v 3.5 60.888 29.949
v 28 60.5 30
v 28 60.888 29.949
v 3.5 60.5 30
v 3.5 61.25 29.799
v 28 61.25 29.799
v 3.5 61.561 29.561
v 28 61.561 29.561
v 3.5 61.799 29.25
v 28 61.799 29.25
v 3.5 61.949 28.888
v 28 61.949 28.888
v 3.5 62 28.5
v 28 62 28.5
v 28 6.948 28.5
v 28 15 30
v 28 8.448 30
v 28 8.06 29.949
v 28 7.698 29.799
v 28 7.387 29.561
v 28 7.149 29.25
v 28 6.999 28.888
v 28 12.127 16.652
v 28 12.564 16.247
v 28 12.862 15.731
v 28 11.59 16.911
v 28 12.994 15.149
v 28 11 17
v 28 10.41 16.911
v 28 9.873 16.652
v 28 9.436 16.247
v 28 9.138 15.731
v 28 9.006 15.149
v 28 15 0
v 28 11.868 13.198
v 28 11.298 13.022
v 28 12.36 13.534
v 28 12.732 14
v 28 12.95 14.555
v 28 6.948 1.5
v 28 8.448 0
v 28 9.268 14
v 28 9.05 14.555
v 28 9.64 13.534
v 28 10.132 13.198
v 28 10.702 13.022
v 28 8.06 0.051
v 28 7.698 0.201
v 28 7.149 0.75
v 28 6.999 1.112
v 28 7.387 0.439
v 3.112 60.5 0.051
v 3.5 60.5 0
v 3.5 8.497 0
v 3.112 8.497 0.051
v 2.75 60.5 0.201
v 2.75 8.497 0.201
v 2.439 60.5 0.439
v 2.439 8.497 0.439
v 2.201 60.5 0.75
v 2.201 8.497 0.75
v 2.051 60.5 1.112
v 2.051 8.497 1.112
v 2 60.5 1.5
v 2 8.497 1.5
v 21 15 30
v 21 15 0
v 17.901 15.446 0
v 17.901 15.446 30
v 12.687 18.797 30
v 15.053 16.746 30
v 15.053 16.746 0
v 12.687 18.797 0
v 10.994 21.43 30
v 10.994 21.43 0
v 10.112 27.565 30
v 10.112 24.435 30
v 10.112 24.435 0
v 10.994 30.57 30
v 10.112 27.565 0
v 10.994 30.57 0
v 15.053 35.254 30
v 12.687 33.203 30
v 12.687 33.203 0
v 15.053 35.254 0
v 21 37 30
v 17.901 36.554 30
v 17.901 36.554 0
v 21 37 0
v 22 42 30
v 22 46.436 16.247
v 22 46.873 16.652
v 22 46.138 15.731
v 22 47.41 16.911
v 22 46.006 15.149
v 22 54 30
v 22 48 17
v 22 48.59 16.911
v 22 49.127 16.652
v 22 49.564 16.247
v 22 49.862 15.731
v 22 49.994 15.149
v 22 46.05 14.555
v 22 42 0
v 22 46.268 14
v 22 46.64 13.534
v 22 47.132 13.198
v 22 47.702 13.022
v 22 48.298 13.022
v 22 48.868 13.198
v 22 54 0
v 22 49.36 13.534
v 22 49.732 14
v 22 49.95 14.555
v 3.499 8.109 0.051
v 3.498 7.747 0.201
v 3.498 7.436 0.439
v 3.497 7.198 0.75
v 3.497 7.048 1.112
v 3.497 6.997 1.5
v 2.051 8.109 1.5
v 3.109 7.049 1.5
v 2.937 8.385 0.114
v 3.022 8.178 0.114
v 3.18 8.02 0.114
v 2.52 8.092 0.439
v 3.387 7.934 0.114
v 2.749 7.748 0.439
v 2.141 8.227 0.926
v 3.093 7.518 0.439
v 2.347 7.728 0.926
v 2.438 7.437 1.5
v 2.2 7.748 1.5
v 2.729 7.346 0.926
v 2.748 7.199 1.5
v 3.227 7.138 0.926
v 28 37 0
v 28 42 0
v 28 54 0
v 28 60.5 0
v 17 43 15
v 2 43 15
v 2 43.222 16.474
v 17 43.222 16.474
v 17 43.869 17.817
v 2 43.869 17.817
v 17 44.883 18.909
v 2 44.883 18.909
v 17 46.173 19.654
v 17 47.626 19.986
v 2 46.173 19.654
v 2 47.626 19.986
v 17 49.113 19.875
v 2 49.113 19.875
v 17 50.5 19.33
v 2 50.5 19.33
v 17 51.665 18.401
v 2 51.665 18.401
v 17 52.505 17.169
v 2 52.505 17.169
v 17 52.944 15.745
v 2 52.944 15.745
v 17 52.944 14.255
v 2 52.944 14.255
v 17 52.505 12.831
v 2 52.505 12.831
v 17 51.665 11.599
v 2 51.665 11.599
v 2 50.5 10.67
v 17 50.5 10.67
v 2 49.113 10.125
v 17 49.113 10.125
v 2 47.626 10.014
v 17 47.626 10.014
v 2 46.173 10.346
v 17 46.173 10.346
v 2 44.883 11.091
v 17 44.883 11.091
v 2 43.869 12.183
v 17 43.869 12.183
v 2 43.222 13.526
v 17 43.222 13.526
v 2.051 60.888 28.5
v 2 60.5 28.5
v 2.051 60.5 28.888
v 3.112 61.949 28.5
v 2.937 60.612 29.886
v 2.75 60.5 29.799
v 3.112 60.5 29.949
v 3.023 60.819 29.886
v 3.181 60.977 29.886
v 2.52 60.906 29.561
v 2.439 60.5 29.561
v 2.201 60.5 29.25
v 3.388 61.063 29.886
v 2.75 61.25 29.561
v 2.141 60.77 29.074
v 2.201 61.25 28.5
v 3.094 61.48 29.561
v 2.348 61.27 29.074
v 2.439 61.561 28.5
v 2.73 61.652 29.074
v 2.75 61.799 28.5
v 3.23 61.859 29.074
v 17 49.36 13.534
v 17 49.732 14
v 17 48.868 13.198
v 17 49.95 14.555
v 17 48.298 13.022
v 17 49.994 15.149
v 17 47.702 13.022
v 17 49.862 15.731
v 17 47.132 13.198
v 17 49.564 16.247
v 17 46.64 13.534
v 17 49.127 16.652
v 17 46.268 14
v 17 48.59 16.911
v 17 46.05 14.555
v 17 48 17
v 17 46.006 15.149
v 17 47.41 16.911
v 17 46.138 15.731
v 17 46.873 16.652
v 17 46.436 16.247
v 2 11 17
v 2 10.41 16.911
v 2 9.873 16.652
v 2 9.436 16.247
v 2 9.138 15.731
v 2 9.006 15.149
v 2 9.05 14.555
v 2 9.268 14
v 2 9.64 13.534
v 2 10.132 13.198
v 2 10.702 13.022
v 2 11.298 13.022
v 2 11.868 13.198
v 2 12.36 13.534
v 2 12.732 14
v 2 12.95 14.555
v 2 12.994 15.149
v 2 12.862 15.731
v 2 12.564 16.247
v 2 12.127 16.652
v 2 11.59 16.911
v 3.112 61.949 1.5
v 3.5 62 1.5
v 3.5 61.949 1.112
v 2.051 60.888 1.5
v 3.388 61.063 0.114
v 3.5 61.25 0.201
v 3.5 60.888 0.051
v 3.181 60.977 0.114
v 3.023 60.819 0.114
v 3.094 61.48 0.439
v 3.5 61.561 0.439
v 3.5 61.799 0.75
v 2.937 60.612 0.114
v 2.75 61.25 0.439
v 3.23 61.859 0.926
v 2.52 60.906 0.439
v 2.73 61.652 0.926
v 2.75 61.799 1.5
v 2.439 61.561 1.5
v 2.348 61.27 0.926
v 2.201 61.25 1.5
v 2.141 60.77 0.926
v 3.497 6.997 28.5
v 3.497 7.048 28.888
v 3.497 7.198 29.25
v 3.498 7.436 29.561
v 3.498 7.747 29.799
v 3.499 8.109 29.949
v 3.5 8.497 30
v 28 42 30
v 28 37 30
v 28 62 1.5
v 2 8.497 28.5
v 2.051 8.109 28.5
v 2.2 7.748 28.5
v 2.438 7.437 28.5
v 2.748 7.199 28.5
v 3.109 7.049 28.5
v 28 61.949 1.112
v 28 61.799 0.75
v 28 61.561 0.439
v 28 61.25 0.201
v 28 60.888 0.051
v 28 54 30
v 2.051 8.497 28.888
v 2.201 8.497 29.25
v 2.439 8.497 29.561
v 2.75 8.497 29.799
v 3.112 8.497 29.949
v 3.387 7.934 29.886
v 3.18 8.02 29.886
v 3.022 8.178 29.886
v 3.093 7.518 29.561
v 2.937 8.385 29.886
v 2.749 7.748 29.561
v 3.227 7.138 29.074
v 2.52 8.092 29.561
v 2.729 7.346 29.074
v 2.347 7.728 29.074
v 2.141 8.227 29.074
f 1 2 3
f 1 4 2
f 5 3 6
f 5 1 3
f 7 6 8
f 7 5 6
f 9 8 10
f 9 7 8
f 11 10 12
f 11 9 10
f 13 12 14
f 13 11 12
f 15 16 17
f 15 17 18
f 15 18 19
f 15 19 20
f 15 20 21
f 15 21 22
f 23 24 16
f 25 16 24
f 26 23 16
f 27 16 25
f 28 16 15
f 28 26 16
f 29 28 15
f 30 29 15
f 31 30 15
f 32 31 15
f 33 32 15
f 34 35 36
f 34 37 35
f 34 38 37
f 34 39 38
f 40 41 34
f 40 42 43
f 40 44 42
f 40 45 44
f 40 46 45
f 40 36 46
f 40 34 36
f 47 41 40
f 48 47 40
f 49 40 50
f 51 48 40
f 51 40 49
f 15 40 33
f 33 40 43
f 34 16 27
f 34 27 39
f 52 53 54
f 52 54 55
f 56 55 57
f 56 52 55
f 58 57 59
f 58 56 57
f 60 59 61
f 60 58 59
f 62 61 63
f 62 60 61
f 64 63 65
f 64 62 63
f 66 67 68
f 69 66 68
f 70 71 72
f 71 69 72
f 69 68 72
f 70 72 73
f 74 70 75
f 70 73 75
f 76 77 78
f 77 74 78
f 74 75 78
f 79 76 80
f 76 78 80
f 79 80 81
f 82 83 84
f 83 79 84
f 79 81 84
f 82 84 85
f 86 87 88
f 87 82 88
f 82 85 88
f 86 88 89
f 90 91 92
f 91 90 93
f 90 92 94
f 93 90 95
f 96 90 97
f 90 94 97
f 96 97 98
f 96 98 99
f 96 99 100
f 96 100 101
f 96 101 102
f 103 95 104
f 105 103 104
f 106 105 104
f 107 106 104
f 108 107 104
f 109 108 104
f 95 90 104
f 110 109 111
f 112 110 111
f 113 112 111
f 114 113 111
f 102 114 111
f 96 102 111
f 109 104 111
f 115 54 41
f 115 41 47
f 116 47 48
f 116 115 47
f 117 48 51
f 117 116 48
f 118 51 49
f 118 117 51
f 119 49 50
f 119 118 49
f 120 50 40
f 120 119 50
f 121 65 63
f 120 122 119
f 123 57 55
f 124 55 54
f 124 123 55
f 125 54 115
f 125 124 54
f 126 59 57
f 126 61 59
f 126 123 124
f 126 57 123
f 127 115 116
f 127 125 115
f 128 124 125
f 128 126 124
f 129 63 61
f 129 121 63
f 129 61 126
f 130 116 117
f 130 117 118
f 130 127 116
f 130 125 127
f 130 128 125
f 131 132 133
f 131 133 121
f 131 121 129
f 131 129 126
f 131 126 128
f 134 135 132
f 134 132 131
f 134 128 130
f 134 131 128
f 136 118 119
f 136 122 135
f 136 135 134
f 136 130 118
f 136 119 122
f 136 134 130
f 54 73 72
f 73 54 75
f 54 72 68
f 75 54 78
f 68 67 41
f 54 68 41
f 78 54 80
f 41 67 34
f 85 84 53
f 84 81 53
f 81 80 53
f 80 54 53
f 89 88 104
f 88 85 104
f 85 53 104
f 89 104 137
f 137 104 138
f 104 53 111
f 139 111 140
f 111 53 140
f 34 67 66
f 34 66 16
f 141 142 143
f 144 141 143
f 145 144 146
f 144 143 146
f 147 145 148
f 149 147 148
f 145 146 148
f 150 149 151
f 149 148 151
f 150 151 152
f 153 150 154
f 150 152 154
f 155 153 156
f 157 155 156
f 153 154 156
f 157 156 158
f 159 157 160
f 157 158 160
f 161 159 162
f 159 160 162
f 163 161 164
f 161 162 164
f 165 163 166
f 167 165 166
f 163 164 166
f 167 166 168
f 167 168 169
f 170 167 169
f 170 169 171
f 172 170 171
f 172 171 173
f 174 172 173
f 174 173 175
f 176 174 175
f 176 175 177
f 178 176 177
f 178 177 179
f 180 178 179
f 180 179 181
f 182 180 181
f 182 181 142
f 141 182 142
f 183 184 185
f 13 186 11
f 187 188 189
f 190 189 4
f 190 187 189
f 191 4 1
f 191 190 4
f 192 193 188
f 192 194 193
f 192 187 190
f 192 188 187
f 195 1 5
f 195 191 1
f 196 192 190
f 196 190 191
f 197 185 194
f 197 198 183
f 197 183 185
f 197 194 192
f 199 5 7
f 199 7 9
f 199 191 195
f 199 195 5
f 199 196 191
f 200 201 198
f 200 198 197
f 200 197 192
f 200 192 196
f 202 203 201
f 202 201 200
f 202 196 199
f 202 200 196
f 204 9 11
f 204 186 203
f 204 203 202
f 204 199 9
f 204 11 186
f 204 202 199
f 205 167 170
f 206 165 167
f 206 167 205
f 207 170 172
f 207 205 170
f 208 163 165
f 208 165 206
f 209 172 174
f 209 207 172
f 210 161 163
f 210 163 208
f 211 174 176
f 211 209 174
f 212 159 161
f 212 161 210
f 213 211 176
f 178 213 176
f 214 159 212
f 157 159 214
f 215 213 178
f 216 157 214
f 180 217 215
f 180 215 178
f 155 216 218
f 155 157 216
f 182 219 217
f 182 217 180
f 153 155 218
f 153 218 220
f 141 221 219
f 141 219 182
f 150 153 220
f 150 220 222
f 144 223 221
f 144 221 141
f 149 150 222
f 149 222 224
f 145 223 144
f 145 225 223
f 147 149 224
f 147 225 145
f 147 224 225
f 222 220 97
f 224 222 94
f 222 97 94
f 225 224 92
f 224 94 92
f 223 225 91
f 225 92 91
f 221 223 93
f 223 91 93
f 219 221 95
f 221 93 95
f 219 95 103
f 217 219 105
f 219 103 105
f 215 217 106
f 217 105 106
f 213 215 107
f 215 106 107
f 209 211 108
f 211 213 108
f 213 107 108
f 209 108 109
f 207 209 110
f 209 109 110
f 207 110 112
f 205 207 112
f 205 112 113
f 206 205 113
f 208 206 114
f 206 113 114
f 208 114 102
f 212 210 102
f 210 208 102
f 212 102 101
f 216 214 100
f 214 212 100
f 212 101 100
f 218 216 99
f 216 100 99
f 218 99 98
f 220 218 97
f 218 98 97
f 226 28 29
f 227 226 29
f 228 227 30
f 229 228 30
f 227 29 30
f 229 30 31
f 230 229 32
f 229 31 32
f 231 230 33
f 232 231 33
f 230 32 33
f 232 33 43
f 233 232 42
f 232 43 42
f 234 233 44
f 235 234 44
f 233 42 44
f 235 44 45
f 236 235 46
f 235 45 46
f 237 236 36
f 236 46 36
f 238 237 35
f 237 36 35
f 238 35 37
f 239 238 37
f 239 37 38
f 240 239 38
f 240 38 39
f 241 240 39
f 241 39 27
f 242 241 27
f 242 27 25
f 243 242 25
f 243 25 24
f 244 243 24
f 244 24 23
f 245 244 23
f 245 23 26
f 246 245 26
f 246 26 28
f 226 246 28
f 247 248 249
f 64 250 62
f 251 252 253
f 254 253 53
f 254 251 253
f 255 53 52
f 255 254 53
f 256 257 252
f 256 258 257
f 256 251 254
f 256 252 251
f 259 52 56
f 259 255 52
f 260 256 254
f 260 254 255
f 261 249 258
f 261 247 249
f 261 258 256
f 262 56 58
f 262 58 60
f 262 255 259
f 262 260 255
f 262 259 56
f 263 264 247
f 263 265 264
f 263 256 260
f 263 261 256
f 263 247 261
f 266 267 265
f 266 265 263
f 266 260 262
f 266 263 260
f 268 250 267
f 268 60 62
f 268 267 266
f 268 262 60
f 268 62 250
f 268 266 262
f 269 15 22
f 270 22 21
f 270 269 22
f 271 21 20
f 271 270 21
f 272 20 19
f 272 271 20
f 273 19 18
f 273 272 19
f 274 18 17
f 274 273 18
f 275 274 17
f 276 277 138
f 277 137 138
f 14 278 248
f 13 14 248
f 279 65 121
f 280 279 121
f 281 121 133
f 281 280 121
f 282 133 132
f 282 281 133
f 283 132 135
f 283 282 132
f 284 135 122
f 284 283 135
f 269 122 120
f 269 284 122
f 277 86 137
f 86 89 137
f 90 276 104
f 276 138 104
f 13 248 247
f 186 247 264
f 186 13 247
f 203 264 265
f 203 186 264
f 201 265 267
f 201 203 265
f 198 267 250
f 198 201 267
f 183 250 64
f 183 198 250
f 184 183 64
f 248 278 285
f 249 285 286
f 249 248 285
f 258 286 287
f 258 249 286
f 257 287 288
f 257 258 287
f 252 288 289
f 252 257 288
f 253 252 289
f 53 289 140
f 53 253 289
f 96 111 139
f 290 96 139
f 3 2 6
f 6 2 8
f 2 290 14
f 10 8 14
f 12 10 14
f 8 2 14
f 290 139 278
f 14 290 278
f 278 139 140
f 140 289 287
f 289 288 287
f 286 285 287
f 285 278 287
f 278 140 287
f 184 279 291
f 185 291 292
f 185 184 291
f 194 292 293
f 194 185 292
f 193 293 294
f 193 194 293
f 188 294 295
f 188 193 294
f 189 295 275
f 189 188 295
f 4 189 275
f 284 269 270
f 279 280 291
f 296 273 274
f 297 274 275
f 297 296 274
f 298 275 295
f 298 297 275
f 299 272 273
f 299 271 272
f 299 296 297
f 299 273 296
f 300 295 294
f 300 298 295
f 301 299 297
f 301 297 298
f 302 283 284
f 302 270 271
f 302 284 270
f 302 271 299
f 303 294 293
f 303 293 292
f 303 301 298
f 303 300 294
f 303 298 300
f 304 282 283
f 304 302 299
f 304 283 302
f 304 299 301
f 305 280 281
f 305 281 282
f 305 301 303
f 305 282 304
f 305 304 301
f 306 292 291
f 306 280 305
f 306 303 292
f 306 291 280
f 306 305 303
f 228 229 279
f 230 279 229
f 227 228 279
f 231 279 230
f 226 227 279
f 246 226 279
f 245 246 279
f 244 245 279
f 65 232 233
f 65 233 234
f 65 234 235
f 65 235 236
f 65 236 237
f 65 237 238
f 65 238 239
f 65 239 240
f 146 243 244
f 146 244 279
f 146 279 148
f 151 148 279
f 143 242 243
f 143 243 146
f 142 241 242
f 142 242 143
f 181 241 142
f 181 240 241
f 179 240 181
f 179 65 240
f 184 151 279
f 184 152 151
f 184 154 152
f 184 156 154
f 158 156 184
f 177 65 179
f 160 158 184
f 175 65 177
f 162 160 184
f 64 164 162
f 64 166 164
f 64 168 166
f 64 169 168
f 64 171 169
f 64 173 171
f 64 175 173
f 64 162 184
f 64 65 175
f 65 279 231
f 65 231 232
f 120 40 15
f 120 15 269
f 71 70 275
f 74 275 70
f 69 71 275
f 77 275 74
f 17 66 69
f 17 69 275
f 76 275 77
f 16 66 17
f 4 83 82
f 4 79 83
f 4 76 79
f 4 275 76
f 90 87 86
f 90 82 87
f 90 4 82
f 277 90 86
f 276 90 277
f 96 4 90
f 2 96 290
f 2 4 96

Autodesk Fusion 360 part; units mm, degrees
sketch "Esboço1" plane through (0, 0, 0) normal (0, 0, 1) x (1, 0, 0)
  arc A0 (21, 37) -> (21, 15) centre (21, 26) ccw
  line L0 (1.9999, 62) -> (2, 62)
  line L1 (2, 7) -> (2, 62)
  line L2 (21, 37) -> (28, 37)
  line L3 (28, 37) -> (28, 42)
  line L4 (28, 42) -> (22, 42)
  line L5 (22, 42) -> (22, 54)
  line L6 (22, 54) -> (28, 54)
  line L7 (28, 54) -> (28, 62)
  line L8 (28, 62) -> (1.9999, 62)
  line L9 (21, 15) -> (28, 15)
  line L10 (28, 15) -> (28, 6.9481)
  line L11 (28, 6.9481) -> (2, 7)
  dimension "d13" = 11
  dimension "d18" = 6
  dimension "d19" = 12
  dimension "d21" = 8
extrude "Extrusão1" add sketch "Esboço1" along normal blind 30
hole "Furo1" at (2, 48, 15) direction (1, 0, 0) diameter 4 depth 40 tip angle 180
hole "Furo2" at (2, 11, 15) direction (1, 0, 0) diameter 4 depth 40 tip angle 180
fillet "Arredondamento1" radius 1.5 8 edges at (2, 34.5, 30) (15, 6.9741, 30) (2, 7, 15) (15, 6.9741, 0) (2, 34.5, 0) (2, 62, 15) (15, 62, 0) (15, 62, 30)
sketch "Esboço2" plane through (2, 0, 0) normal (-1, 0, 0) x (0, -1, 0)
  circle A0 centre (-48, 15) radius 2
  circle A1 centre (-11, 15) radius 2
  line L0 (-60.5, 1.5) -> (-8.497, 1.5)
  line L1 (-8.497, 1.5) -> (-8.497, 28.5)
  line L2 (-8.497, 28.5) -> (-60.5, 28.5)
  line L3 (-60.5, 28.5) -> (-60.5, 1.5)
  circle A2 centre (-48, 15) radius 5
extrude "Extrusão2" cut sketch "Esboço2" against normal blind 15 contours A2
